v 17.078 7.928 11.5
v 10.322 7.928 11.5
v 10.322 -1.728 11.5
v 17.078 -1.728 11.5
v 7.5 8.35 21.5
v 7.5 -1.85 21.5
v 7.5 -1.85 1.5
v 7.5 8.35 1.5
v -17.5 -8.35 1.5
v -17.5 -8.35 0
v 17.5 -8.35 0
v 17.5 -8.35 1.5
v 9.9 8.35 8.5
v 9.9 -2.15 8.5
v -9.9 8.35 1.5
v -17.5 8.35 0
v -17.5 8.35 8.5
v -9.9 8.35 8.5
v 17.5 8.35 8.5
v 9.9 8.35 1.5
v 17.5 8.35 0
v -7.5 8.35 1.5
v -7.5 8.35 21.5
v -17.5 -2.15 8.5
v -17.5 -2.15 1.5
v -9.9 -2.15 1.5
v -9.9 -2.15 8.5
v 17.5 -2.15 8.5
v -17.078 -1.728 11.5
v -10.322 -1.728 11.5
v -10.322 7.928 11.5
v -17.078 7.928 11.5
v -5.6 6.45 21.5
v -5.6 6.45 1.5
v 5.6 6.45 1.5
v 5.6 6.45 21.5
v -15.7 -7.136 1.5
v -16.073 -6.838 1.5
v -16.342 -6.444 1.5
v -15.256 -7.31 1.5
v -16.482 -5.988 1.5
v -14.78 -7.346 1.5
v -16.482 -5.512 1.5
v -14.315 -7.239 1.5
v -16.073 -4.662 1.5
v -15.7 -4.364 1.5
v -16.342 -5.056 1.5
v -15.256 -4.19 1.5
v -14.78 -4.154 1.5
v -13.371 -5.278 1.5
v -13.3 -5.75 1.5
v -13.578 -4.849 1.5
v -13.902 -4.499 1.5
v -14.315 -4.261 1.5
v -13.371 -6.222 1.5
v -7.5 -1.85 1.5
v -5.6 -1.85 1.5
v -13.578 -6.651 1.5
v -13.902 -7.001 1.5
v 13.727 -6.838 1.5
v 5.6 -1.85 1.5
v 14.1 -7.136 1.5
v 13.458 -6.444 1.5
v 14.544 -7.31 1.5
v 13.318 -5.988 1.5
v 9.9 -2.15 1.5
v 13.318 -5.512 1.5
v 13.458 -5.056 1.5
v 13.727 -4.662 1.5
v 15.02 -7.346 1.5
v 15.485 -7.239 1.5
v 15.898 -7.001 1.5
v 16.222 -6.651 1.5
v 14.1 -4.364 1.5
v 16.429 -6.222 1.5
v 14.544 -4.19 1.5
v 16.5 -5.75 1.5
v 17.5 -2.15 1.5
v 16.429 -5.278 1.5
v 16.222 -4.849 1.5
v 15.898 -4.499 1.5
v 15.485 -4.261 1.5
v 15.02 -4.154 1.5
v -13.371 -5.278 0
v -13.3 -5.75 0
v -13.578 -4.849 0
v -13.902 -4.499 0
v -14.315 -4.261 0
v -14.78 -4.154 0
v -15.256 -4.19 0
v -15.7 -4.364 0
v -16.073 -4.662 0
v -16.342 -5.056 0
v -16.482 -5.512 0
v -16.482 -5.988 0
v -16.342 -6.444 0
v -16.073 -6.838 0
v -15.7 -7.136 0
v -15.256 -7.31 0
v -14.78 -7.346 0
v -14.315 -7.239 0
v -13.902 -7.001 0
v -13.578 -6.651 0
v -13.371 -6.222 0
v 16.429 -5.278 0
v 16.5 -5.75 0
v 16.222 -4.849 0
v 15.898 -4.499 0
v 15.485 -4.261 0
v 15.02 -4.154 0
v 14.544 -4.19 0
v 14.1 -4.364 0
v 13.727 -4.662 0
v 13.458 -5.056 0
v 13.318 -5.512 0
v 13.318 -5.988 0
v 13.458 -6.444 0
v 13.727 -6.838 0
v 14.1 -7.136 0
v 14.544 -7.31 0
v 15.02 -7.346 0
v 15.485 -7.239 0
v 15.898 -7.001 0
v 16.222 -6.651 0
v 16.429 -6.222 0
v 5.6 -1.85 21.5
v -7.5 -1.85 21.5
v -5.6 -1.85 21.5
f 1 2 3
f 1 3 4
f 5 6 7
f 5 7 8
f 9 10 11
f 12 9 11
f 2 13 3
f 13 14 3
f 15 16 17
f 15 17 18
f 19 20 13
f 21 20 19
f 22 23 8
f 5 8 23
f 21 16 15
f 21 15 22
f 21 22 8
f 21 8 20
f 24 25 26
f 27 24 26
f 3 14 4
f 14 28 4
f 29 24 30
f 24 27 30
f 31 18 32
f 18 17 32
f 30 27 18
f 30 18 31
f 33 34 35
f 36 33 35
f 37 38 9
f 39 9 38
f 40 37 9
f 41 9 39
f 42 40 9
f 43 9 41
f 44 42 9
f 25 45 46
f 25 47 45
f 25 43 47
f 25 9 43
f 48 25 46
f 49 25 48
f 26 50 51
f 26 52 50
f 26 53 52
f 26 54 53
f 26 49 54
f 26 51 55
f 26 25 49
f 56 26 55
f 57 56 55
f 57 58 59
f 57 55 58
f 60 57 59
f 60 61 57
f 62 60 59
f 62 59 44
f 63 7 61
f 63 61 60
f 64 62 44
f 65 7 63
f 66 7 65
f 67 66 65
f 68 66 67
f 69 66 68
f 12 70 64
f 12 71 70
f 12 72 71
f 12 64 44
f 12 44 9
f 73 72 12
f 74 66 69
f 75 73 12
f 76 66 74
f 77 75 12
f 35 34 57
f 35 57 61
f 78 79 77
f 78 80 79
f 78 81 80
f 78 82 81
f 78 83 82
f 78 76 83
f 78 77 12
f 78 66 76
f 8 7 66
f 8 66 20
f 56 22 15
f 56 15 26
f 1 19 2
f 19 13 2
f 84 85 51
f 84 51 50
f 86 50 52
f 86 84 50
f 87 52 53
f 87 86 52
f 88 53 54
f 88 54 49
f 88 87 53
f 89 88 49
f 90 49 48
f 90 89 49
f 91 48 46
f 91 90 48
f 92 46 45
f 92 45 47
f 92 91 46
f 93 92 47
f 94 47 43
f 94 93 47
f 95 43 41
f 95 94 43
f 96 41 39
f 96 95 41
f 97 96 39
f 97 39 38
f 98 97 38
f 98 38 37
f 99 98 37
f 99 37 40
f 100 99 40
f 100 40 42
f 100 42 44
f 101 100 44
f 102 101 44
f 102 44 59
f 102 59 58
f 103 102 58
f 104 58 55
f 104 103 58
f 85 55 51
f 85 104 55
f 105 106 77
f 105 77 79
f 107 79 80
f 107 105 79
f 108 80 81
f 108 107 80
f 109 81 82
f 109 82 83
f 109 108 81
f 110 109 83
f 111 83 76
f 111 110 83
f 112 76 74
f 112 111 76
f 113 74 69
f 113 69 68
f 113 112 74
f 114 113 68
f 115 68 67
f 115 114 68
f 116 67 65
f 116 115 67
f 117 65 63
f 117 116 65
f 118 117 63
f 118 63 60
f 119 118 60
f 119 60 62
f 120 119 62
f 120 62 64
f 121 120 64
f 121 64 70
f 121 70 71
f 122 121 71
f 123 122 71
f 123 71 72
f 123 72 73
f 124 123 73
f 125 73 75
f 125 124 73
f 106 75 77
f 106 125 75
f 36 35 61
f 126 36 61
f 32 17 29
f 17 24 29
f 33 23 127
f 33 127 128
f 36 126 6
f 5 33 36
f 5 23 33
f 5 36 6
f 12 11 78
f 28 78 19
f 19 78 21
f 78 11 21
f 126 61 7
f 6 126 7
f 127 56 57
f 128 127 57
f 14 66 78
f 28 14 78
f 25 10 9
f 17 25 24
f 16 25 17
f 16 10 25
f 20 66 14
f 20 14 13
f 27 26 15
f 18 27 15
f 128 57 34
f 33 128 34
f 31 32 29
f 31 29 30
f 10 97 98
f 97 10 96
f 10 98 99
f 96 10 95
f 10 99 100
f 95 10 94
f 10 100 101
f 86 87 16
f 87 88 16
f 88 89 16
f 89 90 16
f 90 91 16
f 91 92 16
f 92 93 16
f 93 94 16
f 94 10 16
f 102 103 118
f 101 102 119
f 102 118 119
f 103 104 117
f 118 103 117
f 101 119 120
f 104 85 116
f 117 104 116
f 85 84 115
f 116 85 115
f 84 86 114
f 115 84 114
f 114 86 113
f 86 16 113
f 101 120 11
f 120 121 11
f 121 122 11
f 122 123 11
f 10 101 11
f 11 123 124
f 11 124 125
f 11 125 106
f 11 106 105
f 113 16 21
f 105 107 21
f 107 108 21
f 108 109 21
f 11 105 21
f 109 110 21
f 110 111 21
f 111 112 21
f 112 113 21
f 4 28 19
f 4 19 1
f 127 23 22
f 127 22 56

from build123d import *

# Parameters (mm, degrees)
SKETCH_W     = 35
SKETCH_H     = 16.7
SKETCH_R     = 1.6
PAD_DEPTH    = 1.5
SKETCH001_W  = 7.6
SKETCH001_H  = 10.5
PAD001_DEPTH = 7
SKETCH002_W  = 7.6
SKETCH002_H  = 10.5
PAD002_DEPTH = 3
PAD002_TAPER = 8
PAD003_DEPTH = 20


with BuildPart() as part:
    # Sketch → Pad (new body)
    with BuildSketch(Plane.XY):
        Rectangle(SKETCH_W, SKETCH_H)
        with Locations((-14.9, -5.75)):
            Circle(SKETCH_R, mode=Mode.SUBTRACT)
        with Locations((14.9, -5.75)):
            Circle(SKETCH_R, mode=Mode.SUBTRACT)
    extrude(amount=PAD_DEPTH)

    # Sketch001 (on Face8 of Pad) → Pad001 (join)
    with BuildSketch(Plane.XY.offset(1.5)):
        with Locations((-13.7, 3.1)):
            Rectangle(SKETCH001_W, SKETCH001_H)
        with Locations((13.7, 3.1)):
            Rectangle(SKETCH001_W, SKETCH001_H)
    extrude(amount=PAD001_DEPTH)

    # Sketch002 (on Face17 of Pad001) → Pad002 (join)
    with BuildSketch(Plane.XY.offset(8.5)):
        with Locations((-13.7, 3.1)):
            Rectangle(SKETCH002_W, SKETCH002_H)
        with Locations((13.7, 3.1)):
            Rectangle(SKETCH002_W, SKETCH002_H)
    extrude(amount=PAD002_DEPTH, taper=PAD002_TAPER)

    # Sketch003 (on Face5 of Pad002) → Pad003 (join)
    with BuildSketch(Plane.XY.offset(1.5)):
        Polygon((-7.5, 8.35), (-7.5, -1.85), (-5.6, -1.85), (-5.6, 6.45), (5.6, 6.45), (5.6, -1.85), (7.5, -1.85), (7.5, 8.35), align=None)
    extrude(amount=PAD003_DEPTH)


solid = part.part
